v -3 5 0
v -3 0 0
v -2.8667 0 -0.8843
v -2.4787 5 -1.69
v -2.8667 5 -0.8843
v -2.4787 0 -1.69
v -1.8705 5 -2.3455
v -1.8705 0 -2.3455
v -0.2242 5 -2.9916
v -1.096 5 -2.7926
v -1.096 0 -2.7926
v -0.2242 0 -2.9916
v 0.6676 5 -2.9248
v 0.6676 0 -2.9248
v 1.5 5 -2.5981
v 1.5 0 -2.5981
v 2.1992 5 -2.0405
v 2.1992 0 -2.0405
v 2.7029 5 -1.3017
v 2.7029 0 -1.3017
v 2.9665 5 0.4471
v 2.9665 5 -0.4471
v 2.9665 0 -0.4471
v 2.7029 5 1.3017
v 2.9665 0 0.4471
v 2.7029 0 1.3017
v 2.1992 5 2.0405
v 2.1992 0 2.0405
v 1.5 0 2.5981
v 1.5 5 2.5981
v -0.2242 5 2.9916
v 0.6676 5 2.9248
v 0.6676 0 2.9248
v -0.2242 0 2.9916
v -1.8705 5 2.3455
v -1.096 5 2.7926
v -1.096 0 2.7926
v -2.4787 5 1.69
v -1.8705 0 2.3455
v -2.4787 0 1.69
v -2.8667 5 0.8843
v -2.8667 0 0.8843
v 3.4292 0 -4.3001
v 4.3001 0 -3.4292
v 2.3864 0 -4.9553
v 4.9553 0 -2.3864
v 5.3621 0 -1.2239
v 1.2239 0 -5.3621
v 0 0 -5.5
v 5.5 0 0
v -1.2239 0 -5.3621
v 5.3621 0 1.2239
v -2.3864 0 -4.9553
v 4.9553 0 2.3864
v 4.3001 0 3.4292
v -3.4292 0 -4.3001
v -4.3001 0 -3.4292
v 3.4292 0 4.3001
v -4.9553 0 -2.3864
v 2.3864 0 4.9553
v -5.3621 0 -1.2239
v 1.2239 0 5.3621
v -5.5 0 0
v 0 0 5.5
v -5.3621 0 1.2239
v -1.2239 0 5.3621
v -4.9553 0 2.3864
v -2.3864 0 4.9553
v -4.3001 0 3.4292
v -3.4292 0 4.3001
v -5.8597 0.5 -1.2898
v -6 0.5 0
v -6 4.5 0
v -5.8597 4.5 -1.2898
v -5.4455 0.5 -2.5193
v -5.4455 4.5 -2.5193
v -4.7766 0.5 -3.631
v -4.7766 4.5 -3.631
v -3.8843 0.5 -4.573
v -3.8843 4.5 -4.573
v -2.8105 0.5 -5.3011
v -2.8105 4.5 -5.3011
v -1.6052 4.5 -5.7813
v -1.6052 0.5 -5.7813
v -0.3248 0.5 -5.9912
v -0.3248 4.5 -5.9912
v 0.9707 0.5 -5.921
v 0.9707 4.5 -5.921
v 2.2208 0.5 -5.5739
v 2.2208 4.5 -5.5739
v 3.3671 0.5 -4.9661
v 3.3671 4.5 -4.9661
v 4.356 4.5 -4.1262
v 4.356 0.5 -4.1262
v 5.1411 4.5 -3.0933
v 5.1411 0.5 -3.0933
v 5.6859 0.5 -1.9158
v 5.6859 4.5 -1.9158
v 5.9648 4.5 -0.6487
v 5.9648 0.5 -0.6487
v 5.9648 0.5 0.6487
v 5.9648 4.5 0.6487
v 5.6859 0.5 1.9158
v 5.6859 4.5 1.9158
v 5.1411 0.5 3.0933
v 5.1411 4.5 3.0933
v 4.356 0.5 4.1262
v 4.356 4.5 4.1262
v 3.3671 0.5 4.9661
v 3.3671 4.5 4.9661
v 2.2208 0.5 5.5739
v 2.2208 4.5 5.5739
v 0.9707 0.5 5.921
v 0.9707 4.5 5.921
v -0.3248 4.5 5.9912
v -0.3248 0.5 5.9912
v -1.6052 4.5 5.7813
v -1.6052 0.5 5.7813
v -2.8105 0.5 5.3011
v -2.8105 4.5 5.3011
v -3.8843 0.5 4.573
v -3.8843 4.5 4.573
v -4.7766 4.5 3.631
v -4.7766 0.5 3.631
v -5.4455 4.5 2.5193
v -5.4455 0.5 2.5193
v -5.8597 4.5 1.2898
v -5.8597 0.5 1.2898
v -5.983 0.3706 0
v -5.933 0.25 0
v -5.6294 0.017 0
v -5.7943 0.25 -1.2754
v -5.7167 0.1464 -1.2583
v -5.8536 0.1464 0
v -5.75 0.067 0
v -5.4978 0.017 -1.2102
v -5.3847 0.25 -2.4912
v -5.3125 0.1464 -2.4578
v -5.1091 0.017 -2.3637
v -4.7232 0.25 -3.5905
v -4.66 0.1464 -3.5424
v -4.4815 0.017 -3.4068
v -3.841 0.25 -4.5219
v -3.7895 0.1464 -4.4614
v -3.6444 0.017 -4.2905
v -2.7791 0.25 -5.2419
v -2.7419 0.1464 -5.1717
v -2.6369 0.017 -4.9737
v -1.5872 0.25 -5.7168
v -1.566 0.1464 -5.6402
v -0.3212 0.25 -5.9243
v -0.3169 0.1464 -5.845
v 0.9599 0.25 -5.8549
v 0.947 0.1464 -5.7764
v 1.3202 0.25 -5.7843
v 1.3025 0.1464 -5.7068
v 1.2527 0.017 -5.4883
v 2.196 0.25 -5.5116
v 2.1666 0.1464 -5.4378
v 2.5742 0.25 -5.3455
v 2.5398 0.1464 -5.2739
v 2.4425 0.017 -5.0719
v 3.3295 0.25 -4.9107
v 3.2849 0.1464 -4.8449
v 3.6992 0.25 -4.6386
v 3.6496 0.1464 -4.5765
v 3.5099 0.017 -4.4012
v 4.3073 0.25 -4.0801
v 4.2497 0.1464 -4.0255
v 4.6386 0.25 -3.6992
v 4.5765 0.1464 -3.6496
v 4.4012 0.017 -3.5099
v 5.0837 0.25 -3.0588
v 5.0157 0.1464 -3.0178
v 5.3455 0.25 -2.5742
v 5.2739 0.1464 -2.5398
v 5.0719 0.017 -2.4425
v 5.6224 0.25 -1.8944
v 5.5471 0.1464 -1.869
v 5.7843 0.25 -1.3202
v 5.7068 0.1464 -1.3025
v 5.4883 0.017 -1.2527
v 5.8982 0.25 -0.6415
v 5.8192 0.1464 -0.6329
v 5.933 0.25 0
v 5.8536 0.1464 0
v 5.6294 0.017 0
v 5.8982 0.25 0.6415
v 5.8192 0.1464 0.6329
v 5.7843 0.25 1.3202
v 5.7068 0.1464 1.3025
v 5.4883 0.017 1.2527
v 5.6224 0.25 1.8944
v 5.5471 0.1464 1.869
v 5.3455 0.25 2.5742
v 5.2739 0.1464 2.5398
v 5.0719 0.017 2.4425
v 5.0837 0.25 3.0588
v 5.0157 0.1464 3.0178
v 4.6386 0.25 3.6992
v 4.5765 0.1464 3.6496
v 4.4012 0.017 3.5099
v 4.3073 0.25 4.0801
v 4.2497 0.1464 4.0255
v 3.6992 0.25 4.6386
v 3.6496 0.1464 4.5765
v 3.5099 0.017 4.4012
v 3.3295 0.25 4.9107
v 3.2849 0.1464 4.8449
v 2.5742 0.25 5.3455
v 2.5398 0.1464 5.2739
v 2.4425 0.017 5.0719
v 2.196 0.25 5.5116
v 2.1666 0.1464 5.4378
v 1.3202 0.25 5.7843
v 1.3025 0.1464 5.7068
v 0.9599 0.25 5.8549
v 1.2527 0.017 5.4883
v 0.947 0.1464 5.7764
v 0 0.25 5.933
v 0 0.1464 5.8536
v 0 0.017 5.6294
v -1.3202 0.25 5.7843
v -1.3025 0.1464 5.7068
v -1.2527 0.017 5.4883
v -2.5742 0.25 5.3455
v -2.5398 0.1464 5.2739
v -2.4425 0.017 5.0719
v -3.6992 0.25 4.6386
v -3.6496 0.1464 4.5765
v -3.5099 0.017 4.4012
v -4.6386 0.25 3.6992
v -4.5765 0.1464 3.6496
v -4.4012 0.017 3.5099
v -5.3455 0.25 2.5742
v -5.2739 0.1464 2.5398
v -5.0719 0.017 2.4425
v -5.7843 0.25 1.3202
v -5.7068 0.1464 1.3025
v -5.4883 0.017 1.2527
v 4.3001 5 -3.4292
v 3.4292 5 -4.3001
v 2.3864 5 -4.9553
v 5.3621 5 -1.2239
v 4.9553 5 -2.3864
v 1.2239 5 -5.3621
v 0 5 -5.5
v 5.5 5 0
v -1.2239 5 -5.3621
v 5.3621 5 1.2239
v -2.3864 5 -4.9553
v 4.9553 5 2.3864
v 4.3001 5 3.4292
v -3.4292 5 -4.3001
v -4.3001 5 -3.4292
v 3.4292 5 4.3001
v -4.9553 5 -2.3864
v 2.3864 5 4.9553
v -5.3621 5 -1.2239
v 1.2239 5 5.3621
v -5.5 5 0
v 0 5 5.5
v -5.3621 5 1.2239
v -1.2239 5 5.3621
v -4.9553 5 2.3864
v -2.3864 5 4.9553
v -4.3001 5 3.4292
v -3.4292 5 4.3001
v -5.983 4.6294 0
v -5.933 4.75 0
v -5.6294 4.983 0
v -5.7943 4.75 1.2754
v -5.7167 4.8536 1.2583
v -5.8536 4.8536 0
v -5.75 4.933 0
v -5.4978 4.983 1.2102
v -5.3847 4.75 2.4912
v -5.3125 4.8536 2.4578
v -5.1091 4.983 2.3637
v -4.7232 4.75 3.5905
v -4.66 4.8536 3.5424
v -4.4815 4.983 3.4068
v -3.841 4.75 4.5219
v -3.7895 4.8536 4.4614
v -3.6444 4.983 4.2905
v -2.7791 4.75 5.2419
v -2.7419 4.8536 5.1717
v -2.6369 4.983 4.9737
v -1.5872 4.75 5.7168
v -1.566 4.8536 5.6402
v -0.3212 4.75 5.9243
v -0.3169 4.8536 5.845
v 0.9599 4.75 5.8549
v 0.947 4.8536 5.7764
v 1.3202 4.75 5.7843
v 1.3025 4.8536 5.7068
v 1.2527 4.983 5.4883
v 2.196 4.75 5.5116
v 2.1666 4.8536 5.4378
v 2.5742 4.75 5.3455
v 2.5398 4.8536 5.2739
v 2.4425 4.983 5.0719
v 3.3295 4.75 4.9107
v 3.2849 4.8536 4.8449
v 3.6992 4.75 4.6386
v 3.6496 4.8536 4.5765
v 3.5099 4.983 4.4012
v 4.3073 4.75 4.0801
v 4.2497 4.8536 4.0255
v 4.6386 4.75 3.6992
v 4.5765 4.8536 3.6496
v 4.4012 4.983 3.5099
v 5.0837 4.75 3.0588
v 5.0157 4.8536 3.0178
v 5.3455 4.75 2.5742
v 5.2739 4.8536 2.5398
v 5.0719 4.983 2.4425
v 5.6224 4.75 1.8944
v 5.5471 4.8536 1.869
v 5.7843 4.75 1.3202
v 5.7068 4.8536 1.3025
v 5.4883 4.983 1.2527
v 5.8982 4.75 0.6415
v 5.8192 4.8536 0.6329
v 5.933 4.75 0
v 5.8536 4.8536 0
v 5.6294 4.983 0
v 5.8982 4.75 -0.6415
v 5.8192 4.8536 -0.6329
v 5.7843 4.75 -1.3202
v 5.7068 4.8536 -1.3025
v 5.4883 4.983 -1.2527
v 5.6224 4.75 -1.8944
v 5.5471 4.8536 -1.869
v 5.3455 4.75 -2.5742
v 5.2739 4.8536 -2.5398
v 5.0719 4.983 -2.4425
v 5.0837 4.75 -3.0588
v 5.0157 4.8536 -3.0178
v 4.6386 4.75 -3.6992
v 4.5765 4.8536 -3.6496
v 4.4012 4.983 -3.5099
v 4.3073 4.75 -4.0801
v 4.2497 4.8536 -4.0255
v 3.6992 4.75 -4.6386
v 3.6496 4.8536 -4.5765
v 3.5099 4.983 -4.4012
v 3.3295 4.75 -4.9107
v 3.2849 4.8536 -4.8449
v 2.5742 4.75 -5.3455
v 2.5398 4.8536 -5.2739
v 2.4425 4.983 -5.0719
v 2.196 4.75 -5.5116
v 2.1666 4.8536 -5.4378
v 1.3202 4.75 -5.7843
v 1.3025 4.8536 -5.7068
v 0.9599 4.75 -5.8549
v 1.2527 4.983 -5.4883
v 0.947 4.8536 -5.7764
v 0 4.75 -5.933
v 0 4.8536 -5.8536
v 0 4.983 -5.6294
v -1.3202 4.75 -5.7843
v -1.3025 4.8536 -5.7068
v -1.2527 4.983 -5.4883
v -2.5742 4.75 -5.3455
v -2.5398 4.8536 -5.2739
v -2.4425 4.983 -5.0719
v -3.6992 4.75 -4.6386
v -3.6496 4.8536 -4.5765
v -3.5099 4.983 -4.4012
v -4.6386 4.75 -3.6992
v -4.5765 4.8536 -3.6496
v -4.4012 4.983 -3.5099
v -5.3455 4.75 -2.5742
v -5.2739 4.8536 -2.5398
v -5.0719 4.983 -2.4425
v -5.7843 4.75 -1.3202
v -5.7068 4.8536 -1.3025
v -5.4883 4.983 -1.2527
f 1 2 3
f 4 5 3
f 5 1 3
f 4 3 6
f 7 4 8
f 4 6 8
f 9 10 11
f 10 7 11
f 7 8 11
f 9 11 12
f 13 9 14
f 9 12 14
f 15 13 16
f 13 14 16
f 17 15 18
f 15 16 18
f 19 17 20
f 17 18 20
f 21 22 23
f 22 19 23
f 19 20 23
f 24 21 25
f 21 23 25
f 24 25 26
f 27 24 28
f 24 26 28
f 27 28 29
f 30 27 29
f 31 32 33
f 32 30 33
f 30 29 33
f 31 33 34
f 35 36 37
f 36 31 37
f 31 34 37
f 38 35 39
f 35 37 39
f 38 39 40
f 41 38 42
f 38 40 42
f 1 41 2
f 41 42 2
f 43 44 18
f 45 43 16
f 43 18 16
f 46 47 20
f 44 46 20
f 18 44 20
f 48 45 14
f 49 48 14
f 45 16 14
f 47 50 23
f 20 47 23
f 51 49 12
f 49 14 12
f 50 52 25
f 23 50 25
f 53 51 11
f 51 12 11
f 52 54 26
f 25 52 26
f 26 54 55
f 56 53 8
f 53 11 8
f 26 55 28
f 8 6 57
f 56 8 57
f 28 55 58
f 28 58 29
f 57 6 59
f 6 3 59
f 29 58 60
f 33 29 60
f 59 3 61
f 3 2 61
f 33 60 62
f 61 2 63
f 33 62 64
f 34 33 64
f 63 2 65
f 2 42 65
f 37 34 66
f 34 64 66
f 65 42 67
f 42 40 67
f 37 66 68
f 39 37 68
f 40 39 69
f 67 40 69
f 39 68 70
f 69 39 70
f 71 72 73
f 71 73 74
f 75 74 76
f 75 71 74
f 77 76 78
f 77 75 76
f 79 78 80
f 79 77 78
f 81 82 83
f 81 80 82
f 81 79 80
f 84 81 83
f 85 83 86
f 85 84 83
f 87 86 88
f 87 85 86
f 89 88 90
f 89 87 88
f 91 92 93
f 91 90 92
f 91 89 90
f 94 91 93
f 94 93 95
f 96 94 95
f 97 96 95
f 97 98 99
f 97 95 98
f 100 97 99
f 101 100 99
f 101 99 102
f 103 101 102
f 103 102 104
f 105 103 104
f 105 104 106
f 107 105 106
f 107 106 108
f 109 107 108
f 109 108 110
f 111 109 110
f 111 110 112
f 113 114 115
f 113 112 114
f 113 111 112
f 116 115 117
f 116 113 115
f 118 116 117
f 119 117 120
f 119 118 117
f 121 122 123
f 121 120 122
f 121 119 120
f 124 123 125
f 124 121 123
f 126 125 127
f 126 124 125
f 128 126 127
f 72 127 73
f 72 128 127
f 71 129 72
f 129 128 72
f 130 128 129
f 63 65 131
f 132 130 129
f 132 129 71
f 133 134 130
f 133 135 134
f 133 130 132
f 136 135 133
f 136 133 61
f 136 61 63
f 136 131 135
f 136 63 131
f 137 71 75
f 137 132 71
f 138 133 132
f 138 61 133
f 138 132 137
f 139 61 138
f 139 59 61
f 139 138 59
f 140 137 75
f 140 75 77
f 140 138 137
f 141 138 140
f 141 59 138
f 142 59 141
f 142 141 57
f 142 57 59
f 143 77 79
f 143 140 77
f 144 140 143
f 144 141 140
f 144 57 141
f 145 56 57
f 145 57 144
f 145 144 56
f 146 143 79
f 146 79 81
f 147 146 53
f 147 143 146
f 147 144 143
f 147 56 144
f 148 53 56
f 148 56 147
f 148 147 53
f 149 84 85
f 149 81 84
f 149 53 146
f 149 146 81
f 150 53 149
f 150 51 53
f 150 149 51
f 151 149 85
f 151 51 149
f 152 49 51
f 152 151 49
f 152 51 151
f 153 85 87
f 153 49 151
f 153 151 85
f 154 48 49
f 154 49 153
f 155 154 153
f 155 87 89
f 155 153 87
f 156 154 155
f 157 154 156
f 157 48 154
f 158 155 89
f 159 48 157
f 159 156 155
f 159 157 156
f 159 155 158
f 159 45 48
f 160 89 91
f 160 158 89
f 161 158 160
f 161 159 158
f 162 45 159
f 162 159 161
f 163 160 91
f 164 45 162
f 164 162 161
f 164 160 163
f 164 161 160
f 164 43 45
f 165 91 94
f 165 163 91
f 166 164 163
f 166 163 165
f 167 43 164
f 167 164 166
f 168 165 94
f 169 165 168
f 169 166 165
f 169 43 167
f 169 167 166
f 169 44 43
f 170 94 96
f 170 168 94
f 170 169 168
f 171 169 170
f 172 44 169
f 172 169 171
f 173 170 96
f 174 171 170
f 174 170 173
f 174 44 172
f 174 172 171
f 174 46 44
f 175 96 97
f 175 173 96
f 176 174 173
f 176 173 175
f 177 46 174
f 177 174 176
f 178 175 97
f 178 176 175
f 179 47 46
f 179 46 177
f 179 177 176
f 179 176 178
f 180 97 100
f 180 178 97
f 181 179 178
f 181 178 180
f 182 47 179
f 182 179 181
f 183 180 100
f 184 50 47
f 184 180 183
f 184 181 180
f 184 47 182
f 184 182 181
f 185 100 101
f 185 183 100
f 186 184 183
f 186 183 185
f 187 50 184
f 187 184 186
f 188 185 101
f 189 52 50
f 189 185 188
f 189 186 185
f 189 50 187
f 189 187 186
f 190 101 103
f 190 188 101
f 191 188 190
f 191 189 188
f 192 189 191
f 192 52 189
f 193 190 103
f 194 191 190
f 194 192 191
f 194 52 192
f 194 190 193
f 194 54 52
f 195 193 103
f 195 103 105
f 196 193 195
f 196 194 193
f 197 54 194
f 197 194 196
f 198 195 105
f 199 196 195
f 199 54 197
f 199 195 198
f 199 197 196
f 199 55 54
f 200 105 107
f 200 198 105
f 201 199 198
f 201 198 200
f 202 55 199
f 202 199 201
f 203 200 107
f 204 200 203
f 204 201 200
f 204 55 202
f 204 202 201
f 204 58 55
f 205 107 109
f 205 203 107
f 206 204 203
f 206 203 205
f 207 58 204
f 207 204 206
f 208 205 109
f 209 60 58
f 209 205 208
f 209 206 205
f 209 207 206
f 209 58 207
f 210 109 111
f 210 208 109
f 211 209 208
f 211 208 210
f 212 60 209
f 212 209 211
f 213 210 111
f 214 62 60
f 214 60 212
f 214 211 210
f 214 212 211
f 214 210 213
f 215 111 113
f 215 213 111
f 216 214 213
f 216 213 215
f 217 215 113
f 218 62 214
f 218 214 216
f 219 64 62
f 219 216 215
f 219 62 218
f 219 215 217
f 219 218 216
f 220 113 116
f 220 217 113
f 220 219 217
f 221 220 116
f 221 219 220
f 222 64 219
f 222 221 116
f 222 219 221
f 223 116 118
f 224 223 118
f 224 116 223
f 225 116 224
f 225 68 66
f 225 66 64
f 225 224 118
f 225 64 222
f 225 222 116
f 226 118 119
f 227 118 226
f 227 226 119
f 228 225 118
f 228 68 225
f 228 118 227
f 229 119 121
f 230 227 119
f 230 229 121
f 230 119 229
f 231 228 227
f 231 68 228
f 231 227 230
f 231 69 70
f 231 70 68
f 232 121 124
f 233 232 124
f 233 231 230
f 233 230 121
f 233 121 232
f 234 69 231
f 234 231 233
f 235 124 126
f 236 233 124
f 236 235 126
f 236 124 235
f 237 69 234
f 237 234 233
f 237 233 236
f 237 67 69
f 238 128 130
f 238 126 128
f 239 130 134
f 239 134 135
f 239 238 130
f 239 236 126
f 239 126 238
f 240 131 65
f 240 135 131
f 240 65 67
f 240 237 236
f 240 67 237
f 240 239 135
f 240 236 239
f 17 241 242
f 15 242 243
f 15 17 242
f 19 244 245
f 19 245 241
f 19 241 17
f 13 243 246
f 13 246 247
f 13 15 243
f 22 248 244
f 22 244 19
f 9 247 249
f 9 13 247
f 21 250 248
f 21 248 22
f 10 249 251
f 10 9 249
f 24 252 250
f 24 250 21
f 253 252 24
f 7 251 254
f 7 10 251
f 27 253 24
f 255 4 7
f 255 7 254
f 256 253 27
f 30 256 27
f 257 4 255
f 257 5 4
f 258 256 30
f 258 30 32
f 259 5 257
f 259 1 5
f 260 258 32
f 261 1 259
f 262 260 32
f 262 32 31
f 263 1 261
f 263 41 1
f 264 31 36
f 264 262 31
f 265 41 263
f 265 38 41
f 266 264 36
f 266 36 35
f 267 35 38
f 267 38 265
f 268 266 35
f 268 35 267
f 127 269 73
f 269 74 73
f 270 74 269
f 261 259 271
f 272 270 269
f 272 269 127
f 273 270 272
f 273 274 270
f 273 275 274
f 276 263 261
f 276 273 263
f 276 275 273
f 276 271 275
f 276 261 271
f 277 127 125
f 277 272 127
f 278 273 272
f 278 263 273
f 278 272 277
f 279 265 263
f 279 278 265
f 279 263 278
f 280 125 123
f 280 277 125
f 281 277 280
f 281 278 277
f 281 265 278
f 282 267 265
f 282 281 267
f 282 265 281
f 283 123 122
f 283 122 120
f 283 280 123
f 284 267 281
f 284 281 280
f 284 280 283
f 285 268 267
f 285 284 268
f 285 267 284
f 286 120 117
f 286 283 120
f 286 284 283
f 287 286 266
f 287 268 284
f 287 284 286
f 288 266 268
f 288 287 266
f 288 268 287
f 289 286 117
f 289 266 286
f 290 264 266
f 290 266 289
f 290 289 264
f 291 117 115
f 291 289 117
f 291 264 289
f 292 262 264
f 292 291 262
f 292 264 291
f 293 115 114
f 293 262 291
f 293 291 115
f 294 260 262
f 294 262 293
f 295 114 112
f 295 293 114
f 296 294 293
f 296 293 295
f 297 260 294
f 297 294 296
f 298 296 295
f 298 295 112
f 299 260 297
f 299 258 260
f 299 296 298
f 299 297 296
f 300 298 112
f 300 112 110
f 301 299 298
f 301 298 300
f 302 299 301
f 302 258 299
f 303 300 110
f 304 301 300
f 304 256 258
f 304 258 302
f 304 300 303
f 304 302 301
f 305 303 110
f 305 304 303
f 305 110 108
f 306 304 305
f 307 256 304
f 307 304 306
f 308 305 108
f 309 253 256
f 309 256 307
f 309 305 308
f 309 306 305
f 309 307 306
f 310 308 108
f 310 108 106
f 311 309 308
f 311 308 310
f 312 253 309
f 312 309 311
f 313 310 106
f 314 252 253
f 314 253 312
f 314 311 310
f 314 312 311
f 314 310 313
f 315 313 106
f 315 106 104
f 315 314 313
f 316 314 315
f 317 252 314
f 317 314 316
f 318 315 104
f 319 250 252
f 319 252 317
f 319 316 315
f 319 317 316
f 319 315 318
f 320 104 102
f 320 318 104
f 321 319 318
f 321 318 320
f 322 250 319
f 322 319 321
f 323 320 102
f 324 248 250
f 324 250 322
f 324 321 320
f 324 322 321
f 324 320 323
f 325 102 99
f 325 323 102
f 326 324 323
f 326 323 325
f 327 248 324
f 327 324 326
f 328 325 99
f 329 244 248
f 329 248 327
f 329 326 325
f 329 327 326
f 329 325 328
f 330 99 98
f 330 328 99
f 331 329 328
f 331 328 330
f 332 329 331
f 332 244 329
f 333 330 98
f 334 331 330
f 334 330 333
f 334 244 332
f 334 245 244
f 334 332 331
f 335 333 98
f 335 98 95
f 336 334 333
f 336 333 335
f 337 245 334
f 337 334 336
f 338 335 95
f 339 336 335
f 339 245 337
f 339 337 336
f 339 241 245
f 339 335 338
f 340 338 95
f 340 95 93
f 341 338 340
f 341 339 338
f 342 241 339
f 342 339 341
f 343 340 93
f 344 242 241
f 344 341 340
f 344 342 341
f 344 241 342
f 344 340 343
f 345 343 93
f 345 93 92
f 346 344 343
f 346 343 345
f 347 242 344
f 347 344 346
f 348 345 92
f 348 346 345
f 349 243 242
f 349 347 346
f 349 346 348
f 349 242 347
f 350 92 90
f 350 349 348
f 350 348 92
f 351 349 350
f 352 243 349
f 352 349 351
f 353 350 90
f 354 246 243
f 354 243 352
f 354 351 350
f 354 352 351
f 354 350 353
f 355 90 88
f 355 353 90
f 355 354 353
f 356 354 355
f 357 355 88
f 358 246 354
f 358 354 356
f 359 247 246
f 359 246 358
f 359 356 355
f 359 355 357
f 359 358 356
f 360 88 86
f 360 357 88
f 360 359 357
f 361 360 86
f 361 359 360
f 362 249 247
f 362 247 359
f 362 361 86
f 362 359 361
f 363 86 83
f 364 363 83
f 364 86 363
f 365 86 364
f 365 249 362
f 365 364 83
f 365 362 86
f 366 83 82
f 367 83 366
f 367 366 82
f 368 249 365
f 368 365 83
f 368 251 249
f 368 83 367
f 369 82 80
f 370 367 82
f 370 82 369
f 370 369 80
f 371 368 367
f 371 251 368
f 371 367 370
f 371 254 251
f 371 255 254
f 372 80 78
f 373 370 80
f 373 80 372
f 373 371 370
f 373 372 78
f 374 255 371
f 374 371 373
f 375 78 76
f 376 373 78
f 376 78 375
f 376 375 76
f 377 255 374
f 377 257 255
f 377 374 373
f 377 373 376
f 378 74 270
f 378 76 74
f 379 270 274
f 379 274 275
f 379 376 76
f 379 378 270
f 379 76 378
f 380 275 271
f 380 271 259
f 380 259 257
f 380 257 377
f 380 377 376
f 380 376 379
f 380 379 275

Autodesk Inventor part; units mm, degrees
ref_plane "YZ Plane" through (0, 0, 0) normal (1, 0, 0) x (0, 1, 0)
ref_plane "XZ Plane" through (0, 0, 0) normal (0, 1, 0) x (-1, 0, 0)
ref_plane "XY Plane" through (0, 0, 0) normal (0, 0, 1) x (1, 0, 0)
sketch "スケッチ1" plane through (0, 0, 0) normal (0, 1, 0) x (-1, 0, 0)
  circle A0 centre (0, 0) radius 3
  circle A1 centre (0, 0) radius 6
  dimension "d0" = 6
  dimension "d1" = 12
extrude "押し出し1" add sketch "スケッチ1" along normal blind 5
fillet "フィレット1" radius 0.5 1 edges at (6, 5, 0)
fillet "フィレット2" radius 0.5 1 edges at (6, 0, 0)
properties part number "セットカラー 内径6 外径12 幅5" material "アルミニウム 6061"
